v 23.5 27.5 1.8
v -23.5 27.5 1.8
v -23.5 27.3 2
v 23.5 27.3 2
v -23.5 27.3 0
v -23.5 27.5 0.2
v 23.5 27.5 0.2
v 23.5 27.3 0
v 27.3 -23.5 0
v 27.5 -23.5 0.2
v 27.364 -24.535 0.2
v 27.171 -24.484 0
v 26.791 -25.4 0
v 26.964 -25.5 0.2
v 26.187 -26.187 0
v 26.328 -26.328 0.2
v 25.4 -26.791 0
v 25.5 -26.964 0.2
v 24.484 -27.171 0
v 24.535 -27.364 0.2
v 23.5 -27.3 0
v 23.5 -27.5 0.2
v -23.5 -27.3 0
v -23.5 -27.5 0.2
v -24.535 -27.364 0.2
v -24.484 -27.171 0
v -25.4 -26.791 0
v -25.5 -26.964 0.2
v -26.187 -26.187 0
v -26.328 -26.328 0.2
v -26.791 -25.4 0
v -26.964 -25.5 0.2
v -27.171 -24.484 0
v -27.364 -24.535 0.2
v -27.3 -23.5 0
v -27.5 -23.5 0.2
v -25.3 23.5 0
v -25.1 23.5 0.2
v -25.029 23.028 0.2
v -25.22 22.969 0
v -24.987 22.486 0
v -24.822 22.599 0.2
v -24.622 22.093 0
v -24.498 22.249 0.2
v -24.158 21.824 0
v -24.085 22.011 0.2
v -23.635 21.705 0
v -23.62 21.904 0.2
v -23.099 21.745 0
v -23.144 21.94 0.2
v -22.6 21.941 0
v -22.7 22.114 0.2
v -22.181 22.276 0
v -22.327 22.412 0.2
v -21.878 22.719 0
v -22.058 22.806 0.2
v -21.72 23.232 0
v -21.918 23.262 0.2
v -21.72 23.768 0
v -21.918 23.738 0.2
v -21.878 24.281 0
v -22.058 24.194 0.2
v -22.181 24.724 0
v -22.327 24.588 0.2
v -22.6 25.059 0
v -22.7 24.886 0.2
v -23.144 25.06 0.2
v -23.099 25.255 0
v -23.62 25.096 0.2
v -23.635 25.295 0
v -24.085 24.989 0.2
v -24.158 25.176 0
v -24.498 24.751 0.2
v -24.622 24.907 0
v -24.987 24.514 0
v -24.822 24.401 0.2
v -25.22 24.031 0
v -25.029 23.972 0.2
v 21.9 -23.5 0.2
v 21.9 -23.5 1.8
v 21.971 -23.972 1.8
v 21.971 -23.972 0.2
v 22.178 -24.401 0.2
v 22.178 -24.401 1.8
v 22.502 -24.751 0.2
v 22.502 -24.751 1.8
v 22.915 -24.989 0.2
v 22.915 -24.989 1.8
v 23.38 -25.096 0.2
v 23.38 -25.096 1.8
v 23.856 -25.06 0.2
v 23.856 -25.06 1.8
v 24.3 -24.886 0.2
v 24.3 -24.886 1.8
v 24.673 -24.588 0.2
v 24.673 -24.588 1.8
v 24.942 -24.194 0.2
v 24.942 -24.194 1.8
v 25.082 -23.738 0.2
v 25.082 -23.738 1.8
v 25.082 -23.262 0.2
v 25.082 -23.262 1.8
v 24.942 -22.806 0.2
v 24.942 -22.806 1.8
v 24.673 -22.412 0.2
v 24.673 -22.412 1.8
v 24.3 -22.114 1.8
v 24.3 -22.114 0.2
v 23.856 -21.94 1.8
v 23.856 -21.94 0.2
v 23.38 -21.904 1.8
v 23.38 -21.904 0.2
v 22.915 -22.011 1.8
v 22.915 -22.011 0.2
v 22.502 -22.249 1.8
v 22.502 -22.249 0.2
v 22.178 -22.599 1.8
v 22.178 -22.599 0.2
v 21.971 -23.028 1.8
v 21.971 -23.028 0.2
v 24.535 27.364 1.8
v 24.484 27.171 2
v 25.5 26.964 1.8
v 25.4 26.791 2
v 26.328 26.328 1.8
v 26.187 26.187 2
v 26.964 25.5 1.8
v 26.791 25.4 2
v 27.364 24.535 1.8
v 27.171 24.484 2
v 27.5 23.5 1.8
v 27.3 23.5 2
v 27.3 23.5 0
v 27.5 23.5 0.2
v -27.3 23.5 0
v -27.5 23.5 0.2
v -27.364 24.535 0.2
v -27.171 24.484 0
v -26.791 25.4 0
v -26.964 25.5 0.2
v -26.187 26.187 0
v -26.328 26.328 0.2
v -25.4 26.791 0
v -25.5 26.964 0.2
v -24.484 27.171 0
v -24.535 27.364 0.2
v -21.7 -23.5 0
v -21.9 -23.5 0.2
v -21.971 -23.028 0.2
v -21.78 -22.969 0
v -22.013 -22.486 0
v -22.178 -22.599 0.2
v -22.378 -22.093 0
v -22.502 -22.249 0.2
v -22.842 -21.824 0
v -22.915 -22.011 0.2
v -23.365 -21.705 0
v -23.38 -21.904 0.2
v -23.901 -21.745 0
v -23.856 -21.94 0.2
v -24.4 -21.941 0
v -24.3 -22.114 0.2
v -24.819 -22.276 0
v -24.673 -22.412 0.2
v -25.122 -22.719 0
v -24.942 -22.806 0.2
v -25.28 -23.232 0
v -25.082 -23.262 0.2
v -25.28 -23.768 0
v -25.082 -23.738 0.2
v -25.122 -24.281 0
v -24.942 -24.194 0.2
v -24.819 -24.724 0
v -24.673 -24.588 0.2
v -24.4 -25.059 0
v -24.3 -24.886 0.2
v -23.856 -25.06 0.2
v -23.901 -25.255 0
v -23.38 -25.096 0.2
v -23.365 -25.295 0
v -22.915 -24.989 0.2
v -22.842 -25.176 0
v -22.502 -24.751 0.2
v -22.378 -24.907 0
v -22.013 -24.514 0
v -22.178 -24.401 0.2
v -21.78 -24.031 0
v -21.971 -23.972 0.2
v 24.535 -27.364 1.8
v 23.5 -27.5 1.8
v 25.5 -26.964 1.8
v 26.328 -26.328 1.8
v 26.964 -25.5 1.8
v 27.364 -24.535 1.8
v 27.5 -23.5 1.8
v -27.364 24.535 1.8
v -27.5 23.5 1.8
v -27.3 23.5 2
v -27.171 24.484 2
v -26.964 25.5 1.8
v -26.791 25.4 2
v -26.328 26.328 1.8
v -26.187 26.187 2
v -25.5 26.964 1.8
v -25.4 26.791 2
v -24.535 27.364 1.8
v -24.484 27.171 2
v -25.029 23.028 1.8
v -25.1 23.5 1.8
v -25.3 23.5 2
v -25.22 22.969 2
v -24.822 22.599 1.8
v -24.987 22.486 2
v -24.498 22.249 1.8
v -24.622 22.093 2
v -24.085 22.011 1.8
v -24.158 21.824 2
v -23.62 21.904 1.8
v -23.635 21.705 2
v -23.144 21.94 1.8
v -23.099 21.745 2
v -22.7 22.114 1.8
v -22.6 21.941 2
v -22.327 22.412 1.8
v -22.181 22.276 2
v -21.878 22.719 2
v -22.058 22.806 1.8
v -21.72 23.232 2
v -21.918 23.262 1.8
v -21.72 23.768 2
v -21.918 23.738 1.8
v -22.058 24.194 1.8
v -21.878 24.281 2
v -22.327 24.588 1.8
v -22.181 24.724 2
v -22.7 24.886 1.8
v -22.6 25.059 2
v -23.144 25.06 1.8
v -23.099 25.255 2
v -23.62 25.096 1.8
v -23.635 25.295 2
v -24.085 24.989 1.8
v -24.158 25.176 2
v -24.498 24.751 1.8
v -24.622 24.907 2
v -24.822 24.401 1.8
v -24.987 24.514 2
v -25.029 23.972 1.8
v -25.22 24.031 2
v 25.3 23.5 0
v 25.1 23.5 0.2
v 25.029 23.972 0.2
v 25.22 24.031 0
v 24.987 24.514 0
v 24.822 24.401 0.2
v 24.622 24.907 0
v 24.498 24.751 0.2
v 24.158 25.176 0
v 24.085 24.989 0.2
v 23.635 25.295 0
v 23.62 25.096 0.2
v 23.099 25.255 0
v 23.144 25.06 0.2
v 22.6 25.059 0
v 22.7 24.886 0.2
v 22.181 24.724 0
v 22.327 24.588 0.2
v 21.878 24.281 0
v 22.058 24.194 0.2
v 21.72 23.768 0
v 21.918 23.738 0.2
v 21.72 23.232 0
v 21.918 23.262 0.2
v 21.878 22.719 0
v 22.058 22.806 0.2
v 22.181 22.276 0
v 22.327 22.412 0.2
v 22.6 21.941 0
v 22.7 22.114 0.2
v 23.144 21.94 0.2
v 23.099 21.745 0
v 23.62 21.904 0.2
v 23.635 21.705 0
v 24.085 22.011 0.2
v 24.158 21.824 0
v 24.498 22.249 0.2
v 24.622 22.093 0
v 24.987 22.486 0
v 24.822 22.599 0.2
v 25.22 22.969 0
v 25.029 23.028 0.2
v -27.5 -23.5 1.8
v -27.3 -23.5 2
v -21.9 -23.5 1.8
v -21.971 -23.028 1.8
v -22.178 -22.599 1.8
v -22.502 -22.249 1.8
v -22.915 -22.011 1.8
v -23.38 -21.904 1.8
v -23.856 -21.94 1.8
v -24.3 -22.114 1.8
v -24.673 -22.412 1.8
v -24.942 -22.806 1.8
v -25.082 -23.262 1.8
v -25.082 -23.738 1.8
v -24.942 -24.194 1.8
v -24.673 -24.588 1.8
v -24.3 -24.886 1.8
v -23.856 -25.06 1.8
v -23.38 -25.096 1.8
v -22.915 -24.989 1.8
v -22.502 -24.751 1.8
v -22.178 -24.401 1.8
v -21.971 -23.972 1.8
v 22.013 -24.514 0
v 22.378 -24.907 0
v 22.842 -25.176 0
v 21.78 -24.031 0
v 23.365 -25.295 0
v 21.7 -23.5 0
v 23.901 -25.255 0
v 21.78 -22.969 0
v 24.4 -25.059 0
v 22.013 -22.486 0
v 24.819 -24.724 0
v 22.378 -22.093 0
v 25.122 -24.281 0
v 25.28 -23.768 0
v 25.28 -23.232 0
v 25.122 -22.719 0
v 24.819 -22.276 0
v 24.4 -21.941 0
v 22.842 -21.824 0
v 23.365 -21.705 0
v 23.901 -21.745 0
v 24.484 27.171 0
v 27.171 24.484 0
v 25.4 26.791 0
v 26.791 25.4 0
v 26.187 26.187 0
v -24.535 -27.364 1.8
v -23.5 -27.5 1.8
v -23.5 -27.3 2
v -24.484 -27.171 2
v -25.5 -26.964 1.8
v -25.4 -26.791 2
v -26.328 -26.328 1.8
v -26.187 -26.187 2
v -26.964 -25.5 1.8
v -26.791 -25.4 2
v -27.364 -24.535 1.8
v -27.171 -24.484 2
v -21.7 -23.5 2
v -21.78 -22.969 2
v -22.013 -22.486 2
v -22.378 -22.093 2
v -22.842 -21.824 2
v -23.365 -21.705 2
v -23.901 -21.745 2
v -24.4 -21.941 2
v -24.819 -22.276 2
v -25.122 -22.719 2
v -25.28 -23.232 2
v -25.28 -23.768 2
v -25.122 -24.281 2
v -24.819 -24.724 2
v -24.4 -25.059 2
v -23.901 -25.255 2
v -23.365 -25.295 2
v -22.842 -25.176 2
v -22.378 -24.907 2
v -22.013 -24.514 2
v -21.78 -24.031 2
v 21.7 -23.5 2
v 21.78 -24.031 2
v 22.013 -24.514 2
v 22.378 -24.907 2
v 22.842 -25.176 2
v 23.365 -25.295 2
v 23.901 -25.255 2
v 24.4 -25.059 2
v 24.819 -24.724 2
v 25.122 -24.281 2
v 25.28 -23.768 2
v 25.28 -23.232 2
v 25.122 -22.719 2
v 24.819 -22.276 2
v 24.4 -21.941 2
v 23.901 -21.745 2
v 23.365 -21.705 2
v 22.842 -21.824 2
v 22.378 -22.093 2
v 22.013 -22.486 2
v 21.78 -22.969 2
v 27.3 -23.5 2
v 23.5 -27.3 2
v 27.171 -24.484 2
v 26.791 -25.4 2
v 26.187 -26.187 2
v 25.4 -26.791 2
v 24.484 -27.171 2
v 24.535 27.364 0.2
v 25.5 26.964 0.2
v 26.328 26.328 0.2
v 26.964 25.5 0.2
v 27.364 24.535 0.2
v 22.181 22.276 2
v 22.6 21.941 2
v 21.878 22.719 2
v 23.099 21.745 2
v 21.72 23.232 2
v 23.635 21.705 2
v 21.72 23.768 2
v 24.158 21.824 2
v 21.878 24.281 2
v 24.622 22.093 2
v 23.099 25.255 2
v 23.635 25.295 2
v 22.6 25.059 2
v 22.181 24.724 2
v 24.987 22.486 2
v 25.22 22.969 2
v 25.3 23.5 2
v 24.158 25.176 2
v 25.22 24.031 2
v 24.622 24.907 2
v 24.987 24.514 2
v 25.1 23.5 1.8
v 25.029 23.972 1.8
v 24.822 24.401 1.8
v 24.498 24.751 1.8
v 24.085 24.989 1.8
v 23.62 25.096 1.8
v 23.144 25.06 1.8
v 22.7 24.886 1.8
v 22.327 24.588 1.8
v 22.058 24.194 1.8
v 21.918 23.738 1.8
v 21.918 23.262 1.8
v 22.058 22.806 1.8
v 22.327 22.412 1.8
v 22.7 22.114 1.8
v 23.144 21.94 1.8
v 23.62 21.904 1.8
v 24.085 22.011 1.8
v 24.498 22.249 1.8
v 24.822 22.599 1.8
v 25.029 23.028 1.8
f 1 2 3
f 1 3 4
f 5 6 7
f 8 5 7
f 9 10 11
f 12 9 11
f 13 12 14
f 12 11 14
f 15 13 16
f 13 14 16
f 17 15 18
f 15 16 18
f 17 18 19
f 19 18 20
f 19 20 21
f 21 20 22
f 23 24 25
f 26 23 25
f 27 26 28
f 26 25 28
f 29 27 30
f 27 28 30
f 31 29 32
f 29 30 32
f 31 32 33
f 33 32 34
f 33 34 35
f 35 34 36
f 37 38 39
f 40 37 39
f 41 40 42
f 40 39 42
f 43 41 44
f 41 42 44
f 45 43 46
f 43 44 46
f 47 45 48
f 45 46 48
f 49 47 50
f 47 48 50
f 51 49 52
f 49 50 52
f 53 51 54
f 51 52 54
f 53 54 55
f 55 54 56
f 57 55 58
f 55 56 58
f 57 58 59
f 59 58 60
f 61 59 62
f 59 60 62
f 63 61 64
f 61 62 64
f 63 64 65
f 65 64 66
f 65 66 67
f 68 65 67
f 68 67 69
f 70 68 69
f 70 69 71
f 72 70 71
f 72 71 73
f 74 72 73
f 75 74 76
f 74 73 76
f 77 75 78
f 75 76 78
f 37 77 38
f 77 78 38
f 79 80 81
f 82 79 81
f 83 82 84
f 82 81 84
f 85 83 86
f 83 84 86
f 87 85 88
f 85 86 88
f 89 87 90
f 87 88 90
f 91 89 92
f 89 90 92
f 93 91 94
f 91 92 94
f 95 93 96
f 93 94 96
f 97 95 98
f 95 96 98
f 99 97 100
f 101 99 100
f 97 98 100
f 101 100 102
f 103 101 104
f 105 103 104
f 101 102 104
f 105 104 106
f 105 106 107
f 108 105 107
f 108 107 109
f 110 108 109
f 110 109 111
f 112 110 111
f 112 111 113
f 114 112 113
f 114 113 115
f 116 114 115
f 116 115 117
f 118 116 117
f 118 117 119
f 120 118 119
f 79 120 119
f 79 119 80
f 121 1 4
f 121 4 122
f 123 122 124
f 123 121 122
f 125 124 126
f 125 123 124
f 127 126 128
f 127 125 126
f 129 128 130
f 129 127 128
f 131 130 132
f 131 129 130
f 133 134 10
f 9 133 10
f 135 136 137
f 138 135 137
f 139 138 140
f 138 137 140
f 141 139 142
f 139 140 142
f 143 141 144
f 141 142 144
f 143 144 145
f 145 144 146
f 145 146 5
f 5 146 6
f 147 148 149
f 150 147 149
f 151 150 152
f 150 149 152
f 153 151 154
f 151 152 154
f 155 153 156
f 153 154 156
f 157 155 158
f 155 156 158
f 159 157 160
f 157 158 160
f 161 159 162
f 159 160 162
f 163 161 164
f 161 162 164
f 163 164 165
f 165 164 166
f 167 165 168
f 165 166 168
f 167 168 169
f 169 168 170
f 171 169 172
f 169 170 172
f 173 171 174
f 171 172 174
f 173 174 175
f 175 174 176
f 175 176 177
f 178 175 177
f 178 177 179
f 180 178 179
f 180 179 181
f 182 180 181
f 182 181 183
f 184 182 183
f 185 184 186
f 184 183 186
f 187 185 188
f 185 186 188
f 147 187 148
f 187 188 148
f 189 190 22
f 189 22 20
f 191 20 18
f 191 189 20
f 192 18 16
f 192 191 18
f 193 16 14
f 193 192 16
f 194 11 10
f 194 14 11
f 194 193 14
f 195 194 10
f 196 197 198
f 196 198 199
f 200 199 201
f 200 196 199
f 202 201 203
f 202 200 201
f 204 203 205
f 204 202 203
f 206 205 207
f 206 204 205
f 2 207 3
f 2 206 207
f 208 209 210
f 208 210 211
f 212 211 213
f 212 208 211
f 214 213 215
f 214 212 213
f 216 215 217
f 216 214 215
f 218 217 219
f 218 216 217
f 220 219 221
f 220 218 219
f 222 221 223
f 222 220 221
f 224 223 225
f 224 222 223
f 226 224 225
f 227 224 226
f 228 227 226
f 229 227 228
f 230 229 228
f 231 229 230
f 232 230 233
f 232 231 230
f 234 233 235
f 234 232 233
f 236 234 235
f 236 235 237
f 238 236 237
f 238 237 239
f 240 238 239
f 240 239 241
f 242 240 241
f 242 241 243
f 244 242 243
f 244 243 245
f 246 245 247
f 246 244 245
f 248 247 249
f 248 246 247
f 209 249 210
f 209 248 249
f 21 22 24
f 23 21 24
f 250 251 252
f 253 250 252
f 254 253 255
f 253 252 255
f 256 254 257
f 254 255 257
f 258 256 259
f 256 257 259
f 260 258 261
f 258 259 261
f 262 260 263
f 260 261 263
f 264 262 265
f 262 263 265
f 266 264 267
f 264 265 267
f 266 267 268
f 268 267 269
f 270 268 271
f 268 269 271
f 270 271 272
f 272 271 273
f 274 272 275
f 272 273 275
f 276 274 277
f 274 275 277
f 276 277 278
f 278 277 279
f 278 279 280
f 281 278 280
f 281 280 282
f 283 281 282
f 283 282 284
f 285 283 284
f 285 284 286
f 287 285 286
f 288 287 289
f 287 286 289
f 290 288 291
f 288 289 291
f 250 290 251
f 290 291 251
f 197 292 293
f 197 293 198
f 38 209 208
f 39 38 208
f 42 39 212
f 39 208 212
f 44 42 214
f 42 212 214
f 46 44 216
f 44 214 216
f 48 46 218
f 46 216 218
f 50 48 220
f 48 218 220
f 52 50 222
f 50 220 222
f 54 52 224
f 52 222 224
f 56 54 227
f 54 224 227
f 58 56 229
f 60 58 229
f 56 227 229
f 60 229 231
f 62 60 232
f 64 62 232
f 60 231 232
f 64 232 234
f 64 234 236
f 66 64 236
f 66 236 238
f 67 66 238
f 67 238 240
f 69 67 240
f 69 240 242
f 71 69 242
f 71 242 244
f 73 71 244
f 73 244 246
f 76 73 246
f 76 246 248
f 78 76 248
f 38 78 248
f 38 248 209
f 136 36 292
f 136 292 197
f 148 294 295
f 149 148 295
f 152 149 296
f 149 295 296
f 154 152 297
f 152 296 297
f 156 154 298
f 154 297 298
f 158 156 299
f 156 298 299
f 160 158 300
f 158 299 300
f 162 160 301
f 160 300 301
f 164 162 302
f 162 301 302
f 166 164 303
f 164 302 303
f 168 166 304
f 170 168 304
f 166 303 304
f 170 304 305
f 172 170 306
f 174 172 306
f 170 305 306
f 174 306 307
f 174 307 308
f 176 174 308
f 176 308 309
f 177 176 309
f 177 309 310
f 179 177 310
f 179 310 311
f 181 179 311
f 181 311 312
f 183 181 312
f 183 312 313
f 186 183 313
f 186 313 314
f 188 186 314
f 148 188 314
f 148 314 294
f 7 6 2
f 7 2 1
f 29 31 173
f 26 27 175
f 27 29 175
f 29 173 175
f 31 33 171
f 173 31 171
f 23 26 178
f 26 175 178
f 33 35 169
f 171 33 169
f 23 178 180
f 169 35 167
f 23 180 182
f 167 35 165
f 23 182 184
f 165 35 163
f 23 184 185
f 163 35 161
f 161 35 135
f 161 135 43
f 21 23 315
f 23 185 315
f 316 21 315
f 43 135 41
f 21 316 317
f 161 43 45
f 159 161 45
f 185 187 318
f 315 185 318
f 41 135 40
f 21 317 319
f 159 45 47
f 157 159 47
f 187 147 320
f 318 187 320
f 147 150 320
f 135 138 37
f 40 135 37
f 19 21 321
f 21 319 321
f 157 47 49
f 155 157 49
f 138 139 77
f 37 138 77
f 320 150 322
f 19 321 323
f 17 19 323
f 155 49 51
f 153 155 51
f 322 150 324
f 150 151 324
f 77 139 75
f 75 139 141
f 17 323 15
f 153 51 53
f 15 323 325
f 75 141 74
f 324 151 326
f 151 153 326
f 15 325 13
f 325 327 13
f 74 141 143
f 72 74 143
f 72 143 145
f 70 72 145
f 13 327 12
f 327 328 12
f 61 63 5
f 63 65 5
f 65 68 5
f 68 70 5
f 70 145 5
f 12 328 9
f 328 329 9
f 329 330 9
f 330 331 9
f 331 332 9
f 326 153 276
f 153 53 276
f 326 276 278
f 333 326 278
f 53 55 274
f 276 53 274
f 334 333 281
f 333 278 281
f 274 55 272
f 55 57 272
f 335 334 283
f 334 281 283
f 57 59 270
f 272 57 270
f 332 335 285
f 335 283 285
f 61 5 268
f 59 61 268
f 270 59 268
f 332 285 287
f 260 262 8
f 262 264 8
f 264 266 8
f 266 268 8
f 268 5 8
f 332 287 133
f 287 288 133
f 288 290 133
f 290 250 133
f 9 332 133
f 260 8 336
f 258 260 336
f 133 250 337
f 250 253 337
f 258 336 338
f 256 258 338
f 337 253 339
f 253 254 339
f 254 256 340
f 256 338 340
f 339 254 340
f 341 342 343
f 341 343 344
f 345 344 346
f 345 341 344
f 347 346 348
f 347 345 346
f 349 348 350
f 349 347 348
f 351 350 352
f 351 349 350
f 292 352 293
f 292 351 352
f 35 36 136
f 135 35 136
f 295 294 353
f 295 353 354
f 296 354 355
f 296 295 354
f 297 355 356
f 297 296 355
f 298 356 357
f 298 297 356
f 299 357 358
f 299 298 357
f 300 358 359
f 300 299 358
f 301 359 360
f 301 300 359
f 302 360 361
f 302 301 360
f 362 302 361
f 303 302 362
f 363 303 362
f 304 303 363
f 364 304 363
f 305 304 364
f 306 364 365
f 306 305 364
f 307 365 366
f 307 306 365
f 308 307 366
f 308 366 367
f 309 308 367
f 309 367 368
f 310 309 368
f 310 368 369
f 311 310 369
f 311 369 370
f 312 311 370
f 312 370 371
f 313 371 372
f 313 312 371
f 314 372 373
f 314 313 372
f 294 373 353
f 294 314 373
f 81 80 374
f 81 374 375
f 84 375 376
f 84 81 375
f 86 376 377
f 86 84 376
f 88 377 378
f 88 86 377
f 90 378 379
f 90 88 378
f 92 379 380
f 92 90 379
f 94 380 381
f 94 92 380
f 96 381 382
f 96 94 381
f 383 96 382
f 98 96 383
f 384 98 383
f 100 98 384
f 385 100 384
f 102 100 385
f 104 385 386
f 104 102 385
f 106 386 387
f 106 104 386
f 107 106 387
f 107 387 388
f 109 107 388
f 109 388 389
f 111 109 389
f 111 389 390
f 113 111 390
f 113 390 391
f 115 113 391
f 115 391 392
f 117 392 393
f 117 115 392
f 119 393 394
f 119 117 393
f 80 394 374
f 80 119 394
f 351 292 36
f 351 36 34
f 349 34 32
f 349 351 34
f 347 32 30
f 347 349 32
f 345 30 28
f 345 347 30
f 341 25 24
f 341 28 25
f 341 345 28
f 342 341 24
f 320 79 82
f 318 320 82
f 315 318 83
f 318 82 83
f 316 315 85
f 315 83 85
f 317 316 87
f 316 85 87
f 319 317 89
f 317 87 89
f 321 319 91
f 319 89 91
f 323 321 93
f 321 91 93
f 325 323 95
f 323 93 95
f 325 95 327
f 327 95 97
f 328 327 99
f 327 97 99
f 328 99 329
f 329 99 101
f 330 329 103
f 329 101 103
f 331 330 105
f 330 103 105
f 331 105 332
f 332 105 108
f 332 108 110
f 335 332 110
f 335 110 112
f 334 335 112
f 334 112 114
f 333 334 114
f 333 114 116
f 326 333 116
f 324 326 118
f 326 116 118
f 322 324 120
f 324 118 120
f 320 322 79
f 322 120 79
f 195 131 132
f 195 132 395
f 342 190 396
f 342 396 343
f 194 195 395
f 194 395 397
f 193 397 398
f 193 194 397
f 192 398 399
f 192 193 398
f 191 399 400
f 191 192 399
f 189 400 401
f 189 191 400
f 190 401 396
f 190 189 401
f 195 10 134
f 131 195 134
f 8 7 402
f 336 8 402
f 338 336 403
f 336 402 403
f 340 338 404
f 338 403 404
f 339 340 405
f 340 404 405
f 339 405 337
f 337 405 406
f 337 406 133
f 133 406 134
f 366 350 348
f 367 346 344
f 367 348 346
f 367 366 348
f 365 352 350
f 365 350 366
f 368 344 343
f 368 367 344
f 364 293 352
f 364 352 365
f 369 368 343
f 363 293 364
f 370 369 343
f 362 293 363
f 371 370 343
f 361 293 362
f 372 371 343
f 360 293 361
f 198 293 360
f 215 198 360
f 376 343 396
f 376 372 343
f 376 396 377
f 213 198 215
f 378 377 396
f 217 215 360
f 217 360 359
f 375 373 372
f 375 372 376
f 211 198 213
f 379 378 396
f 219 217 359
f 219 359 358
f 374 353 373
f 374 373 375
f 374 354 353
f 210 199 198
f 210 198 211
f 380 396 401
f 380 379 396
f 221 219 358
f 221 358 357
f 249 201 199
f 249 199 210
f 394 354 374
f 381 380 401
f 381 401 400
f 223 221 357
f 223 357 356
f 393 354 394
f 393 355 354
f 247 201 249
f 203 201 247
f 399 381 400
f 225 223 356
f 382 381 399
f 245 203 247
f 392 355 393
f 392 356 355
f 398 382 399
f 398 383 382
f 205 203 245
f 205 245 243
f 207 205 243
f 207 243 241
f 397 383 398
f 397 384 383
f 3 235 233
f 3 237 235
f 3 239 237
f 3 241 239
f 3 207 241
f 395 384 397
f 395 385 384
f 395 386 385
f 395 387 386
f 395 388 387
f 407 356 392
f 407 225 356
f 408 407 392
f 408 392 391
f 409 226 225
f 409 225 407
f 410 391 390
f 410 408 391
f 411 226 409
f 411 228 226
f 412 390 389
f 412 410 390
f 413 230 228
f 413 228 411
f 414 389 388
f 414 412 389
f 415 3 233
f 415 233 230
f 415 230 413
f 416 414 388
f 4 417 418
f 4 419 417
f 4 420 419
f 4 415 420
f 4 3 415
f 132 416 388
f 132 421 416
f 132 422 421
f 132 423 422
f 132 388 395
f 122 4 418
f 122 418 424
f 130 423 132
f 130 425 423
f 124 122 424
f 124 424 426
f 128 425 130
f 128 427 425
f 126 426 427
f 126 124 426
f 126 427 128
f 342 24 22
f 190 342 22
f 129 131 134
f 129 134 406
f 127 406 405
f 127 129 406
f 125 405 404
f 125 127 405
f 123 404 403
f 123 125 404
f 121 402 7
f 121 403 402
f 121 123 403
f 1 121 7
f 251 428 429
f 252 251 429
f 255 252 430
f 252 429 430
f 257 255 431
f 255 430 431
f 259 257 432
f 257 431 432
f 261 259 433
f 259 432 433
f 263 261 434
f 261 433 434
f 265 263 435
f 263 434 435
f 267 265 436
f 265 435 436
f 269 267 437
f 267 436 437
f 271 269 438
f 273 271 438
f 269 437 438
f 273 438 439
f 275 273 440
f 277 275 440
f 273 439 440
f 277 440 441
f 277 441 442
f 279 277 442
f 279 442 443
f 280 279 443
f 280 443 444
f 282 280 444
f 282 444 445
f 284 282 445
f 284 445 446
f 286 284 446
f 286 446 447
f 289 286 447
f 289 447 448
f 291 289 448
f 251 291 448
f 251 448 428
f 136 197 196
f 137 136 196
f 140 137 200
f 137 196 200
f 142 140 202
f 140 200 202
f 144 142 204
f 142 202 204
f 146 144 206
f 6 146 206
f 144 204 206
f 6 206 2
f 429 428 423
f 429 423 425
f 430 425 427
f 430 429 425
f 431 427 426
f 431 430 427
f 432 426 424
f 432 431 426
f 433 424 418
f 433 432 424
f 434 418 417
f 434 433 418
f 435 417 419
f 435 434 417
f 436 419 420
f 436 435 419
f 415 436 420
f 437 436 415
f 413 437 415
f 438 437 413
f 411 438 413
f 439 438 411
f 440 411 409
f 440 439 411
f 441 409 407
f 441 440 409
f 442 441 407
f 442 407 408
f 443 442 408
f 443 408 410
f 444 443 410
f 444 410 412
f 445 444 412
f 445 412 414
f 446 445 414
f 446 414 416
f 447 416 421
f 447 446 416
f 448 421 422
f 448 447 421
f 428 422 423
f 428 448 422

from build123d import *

# Parameters (mm, degrees)
SKETCH3_W           = 55
SKETCH3_H           = 55
BOSS_EXTRUDE1_DEPTH = 2
CUT_EXTRUDE1_DEPTH  = 2
SKETCH6_R           = 1.6
CUT_EXTRUDE2_DEPTH  = 39.942264957
CHAMFER1_SIZE       = 0.2
CHAMFER2_SIZE       = 0.2


with BuildPart() as part:
    # Sketch3 → Boss-Extrude1 (new body)
    with BuildSketch(Plane.XY):
        Rectangle(SKETCH3_W, SKETCH3_H)
    extrude(amount=BOSS_EXTRUDE1_DEPTH)

    # Sketch4 → Cut-Extrude1 (cut)
    with BuildSketch(Plane.XY.offset(2)):
        with BuildLine():
            Line((-23.5, 27.5), (-27.5, 27.5))
            Line((-27.5, 27.5), (-27.5, 23.5))
            ThreePointArc((-27.5, 23.5), (-26.328427125, 26.328427125), (-23.5, 27.5))
        make_face()
        with BuildLine():
            Line((23.5, 27.5), (27.5, 27.5))
            Line((27.5, 27.5), (27.5, 23.5))
            ThreePointArc((27.5, 23.5), (26.328427125, 26.328427125), (23.5, 27.5))
        make_face()
        with BuildLine():
            Line((27.5, -23.5), (27.5, -27.5))
            Line((27.5, -27.5), (23.5, -27.5))
            ThreePointArc((23.5, -27.5), (26.328427125, -26.328427125), (27.5, -23.5))
        make_face()
        with BuildLine():
            Line((-23.5, -27.5), (-27.5, -27.5))
            Line((-27.5, -27.5), (-27.5, -23.5))
            ThreePointArc((-27.5, -23.5), (-26.328427125, -26.328427125), (-23.5, -27.5))
        make_face()
    extrude(amount=-CUT_EXTRUDE1_DEPTH, mode=Mode.SUBTRACT)

    # Sketch6 → Cut-Extrude2 (cut, through all)
    with BuildSketch(Plane.XY.offset(2)):
        with Locations((23.5, 23.5)):
            Circle(SKETCH6_R)
        with Locations(Location((-23.5, 23.5, 0), (0, 0, 180))):
            Circle(SKETCH6_R)
        with Locations(Location((23.5, -23.5, 0), (0, 0, 180))):
            Circle(SKETCH6_R)
        with Locations((-23.5, -23.5)):
            Circle(SKETCH6_R)
    extrude(amount=-CUT_EXTRUDE2_DEPTH, mode=Mode.SUBTRACT)

    # Chamfer1
    chamfer1_edges = [part.edges().sort_by_distance(p)[0] for p in [
        (0, 27.5, 0),
        (26.328427125, 26.328427125, 0),
        (27.5, 0, 0),
        (0, -27.5, 0),
        (-27.5, 0, 0),
        (-26.328427125, 26.328427125, 0),
        (26.328427125, -26.328427125, 0),
        (-26.328427125, -26.328427125, 0),
        (21.9, 23.5, 0),
        (-21.9, 23.5, 0),
        (25.1, -23.5, 0),
        (-25.1, -23.5, 0),
    ]]
    chamfer(chamfer1_edges, length=CHAMFER1_SIZE)

    # Chamfer2
    chamfer2_edges = [part.edges().sort_by_distance(p)[0] for p in [
        (0, 27.5, 2),
        (26.328427125, 26.328427125, 2),
        (-27.5, 0, 2),
        (0, -27.5, 2),
        (27.5, 0, 2),
        (-26.328427125, 26.328427125, 2),
        (26.328427125, -26.328427125, 2),
        (-26.328427125, -26.328427125, 2),
        (21.9, 23.5, 2),
        (-21.9, 23.5, 2),
        (25.1, -23.5, 2),
        (-25.1, -23.5, 2),
    ]]
    chamfer(chamfer2_edges, length=CHAMFER2_SIZE)


solid = part.part
